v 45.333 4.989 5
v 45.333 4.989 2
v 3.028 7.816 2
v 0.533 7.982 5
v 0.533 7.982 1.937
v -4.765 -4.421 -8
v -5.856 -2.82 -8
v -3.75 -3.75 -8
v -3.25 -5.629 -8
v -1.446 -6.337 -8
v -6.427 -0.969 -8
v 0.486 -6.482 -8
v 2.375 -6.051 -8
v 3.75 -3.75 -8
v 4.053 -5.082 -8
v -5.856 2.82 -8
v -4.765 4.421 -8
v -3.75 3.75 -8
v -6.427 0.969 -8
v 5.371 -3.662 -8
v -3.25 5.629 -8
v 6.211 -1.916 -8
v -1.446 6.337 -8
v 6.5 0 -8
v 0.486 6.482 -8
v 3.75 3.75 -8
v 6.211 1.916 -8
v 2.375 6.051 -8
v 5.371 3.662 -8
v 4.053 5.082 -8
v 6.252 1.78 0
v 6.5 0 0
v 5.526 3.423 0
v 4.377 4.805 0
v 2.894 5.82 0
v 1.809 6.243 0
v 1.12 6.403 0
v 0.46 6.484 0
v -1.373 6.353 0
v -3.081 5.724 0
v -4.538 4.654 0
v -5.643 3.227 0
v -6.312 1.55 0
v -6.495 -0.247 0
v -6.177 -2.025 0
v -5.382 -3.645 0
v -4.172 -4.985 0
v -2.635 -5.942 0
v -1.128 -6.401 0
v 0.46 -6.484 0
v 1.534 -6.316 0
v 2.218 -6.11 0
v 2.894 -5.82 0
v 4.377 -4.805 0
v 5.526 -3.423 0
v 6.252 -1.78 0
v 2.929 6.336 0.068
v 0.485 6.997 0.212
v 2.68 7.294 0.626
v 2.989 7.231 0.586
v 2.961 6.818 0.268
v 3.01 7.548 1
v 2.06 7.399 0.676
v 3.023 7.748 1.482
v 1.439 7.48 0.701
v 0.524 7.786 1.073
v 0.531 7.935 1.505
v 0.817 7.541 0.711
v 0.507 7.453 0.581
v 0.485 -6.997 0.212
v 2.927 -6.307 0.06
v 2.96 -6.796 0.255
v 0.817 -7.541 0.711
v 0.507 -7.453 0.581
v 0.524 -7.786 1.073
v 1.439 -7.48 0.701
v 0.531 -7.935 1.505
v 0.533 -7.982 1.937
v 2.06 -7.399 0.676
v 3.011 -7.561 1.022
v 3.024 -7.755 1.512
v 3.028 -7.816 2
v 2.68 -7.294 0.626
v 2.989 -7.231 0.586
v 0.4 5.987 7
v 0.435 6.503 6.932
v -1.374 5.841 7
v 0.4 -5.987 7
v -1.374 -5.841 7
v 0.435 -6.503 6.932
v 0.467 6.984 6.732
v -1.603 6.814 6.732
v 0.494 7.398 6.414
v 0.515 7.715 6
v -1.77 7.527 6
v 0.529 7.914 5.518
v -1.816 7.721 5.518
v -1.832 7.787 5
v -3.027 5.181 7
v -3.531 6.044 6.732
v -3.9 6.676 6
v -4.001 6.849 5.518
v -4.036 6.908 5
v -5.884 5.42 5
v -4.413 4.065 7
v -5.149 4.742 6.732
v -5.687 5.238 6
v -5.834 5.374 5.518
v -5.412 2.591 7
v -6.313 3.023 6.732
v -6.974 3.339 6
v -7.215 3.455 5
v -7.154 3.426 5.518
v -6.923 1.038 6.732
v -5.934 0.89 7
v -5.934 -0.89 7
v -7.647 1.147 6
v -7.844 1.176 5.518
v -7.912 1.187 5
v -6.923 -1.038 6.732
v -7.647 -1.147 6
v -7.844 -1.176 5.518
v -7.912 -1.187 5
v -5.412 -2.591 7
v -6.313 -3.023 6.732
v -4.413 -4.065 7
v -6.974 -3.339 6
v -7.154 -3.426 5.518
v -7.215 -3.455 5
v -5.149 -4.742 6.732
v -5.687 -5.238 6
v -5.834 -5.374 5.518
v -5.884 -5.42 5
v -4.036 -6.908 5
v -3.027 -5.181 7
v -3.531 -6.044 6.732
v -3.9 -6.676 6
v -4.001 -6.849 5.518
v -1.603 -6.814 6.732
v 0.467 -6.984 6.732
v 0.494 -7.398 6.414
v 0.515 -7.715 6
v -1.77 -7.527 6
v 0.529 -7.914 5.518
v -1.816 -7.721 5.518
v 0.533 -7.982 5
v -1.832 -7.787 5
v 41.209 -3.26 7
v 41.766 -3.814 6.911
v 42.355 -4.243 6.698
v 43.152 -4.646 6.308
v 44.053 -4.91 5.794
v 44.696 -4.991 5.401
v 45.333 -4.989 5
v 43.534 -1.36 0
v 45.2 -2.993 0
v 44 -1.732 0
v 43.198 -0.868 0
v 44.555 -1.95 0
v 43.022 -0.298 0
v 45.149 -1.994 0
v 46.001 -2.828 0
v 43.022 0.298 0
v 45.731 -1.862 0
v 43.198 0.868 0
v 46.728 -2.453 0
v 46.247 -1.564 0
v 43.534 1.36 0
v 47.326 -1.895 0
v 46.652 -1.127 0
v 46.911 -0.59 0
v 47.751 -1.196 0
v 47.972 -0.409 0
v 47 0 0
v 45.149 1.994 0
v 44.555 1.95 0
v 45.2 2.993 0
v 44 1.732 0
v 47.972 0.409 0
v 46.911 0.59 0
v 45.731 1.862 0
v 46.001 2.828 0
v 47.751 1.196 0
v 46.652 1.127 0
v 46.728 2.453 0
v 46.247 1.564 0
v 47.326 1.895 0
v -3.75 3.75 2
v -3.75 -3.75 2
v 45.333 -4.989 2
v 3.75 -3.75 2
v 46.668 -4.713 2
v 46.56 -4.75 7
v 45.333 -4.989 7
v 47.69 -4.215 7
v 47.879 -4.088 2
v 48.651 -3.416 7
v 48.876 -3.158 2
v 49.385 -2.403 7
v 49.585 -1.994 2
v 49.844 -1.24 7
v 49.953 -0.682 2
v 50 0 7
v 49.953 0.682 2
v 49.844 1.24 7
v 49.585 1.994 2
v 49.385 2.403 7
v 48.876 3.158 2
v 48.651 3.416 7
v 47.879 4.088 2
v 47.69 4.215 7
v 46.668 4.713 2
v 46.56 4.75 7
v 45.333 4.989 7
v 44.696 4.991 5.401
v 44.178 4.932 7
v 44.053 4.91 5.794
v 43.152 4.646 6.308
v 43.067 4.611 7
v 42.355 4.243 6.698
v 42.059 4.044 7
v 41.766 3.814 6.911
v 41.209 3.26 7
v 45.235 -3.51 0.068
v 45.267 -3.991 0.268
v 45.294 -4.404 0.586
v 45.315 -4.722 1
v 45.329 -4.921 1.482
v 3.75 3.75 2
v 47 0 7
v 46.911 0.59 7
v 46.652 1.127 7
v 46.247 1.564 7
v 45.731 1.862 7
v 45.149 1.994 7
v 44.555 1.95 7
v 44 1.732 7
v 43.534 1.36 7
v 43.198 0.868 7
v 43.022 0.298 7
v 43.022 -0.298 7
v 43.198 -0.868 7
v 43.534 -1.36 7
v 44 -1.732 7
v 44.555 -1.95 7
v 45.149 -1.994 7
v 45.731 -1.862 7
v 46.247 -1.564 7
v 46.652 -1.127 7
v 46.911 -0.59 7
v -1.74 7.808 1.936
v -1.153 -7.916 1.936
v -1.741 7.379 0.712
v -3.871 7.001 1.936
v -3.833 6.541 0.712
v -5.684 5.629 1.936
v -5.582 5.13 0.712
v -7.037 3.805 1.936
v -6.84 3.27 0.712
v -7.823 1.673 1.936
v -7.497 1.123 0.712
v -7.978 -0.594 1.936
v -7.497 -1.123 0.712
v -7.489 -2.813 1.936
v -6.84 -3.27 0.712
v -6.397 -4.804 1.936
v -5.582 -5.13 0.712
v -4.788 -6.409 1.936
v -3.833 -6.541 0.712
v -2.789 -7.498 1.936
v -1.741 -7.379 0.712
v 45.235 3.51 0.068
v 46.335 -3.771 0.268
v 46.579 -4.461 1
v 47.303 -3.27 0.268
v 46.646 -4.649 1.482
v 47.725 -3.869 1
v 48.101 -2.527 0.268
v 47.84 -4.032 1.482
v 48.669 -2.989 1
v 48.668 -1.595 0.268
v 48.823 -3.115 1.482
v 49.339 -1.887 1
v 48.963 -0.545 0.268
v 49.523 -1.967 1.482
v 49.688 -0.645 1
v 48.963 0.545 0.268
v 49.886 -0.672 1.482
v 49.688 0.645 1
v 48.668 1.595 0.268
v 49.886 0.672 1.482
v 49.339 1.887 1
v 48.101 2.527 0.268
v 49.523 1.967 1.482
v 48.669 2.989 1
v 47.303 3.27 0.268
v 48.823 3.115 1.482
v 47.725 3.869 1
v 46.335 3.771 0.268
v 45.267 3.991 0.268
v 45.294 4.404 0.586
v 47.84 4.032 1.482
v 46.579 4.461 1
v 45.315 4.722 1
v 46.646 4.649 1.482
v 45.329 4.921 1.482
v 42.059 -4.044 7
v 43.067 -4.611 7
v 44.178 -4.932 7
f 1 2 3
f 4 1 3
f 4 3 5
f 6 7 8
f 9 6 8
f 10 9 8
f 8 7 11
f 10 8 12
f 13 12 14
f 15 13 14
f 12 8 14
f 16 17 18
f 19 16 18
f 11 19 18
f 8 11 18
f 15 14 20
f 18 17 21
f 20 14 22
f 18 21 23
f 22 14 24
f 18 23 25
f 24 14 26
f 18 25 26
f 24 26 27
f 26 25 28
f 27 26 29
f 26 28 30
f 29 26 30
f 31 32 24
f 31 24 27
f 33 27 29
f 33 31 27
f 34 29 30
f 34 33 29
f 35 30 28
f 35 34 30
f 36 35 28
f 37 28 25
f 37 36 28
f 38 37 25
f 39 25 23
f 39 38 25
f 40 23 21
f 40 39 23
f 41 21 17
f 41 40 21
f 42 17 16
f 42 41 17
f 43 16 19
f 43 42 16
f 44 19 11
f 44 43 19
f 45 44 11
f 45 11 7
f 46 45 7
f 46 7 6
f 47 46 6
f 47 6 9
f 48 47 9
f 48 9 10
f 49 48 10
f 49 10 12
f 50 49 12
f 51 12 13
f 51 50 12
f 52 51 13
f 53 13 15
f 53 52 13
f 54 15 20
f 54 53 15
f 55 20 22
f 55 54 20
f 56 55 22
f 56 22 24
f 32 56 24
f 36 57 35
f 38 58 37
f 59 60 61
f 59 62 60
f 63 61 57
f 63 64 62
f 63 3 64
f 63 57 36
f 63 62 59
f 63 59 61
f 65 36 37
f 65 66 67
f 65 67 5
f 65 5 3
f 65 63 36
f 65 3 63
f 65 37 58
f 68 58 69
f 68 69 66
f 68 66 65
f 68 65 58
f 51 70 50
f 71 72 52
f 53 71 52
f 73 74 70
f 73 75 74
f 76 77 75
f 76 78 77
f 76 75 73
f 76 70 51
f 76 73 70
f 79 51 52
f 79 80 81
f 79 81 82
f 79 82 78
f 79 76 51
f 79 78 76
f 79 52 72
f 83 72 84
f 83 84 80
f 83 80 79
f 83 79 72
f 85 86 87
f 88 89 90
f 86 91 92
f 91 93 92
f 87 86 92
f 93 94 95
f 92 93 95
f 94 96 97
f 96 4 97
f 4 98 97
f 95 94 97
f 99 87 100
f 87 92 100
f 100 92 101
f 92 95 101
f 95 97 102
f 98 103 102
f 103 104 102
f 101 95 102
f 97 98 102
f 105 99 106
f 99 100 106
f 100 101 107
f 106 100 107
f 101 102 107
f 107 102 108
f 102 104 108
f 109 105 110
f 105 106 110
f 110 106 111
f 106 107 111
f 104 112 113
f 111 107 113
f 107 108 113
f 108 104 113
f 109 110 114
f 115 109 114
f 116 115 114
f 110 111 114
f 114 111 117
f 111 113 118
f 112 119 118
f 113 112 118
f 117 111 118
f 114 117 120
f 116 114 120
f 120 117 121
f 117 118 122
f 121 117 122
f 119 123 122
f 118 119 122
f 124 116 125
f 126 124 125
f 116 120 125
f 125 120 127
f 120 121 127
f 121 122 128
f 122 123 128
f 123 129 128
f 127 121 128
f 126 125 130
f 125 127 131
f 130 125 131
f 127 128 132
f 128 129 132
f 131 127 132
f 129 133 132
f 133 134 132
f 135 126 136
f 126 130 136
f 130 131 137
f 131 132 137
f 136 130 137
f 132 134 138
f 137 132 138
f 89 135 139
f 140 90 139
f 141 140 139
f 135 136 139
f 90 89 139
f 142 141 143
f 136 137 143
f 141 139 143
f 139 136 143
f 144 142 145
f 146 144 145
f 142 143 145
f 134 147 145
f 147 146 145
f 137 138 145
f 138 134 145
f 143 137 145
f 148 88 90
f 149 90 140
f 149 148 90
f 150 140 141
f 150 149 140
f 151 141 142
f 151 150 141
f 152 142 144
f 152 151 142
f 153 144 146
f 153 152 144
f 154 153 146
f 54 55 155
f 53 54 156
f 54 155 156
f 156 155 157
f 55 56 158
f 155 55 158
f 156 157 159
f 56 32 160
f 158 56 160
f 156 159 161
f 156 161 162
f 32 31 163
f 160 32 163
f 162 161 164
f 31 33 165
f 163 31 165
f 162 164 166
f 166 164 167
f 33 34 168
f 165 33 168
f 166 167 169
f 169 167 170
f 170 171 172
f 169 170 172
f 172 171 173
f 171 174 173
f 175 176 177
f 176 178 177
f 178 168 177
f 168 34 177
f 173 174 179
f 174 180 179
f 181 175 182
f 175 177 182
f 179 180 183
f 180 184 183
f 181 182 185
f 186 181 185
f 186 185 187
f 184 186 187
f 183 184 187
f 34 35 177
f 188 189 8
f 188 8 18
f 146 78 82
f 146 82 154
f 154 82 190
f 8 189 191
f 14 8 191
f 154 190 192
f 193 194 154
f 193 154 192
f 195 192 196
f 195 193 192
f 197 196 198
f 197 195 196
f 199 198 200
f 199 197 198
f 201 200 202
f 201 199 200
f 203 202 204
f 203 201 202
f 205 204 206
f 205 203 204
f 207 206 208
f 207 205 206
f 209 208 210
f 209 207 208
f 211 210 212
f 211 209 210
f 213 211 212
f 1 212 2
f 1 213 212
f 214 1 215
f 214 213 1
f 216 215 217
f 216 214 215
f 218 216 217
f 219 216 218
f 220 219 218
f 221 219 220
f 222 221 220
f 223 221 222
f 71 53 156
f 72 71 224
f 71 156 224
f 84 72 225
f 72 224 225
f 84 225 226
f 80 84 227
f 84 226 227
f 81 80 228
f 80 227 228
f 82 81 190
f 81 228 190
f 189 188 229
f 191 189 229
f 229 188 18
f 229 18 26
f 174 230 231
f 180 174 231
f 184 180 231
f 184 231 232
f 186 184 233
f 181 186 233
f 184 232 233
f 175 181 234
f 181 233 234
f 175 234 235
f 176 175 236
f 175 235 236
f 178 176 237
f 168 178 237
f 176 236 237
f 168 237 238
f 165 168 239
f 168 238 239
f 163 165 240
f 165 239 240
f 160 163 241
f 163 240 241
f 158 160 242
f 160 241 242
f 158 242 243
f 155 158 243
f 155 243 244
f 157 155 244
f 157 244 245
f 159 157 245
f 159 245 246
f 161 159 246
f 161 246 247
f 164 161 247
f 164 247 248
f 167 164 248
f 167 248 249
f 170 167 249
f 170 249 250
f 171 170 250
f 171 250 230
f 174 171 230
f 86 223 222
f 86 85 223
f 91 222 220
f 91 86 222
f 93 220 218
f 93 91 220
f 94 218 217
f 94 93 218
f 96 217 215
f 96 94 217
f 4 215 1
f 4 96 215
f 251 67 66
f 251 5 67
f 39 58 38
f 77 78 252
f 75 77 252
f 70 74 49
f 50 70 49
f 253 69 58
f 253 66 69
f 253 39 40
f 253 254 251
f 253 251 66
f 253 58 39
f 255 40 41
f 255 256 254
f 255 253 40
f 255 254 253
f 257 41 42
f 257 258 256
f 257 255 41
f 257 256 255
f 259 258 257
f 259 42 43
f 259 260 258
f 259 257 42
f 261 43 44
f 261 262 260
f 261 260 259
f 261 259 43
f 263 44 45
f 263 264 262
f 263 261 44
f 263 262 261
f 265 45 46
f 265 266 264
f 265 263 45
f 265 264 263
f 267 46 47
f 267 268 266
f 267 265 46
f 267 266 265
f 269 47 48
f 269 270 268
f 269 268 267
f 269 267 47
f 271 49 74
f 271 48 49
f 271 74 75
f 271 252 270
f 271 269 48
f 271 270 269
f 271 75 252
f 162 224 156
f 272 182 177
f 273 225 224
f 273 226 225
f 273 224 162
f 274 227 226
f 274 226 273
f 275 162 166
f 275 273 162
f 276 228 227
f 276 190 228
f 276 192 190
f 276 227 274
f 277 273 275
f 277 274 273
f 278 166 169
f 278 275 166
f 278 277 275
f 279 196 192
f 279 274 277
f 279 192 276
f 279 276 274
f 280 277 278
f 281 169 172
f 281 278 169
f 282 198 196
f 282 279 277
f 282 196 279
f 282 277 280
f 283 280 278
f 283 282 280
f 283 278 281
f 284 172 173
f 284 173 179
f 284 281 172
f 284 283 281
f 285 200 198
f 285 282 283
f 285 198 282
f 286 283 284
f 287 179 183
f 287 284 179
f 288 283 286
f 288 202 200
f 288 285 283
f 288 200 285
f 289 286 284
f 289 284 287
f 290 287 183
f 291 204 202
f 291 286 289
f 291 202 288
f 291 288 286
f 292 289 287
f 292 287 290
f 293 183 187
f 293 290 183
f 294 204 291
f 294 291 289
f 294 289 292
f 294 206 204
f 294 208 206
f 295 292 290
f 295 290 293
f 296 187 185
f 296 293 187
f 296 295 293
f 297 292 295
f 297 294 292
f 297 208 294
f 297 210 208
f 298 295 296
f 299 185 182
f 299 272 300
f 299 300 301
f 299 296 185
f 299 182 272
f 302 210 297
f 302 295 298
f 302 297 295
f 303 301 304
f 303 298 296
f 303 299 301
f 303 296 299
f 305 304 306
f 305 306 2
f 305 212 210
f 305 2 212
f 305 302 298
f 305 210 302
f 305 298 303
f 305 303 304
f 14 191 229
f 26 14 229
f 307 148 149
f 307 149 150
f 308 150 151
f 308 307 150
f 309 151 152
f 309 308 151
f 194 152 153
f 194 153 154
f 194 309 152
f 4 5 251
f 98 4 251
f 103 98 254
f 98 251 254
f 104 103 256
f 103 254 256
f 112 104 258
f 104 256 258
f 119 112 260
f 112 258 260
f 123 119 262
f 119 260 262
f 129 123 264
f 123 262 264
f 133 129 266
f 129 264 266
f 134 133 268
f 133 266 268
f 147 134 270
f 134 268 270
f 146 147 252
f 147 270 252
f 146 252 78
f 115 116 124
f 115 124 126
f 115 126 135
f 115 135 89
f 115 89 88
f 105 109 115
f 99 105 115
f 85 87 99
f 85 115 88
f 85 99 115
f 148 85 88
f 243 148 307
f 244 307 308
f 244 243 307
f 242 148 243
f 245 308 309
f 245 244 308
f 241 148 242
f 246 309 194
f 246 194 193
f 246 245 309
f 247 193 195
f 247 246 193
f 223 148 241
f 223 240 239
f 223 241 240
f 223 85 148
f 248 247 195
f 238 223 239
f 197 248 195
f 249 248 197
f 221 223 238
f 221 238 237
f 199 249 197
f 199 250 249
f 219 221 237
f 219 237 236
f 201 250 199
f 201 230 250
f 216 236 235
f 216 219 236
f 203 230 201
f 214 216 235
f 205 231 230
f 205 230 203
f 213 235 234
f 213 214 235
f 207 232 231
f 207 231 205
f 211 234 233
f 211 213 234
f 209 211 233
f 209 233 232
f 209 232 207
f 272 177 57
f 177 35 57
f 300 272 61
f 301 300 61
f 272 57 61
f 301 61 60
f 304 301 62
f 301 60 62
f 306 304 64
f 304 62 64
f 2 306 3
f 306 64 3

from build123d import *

# Parameters (mm, degrees)
F1_DEPTH = 7
F2_R     = 6.5
F2_W     = 7.5
F2_H     = 7.5
F3_DEPTH = 15
F2_R_2   = 2
F4_DEPTH = 25
F5_START = -5
F5_DEPTH = 10.001
F6_R     = 2
F7_DEPTH = 2.8


with BuildPart() as f1:
    # F0 (on Top) → F1 (new body)
    with BuildSketch(Plane.XY):
        with BuildLine():
            Line((45.3333333333, 4.9888765157), (0.5333333333, 7.9822024251))
            ThreePointArc((0.5333333333, 7.9822024251), (-8, 0), (0.5333333333, -7.9822024251))
            Line((0.5333333333, -7.9822024251), (45.3333333333, -4.9888765157))
            ThreePointArc((45.3333333333, -4.9888765157), (50, 0), (45.3333333333, 4.9888765157))
        make_face()
    extrude(amount=F1_DEPTH)

    # F2 (on face) → F3 (join)
    with BuildSketch(Plane.XY.offset(7)):
        Circle(F2_R)
        Rectangle(F2_W, F2_H, mode=Mode.SUBTRACT)
    extrude(amount=-F3_DEPTH)

    # F2 (on face) → F4 (cut)
    with BuildSketch(Plane.XY.offset(7)):
        with Locations((45, 0)):
            Circle(F2_R_2)
    extrude(amount=-F4_DEPTH, mode=Mode.SUBTRACT)

    # F2 (on face) → F5 (cut)
    with BuildSketch(Plane.XY.offset(7).offset(F5_START)):
        Rectangle(F2_W, F2_H)
    extrude(amount=-F5_DEPTH, mode=Mode.SUBTRACT)

    # F6
    f6_edges = [f1.edges().sort_by_distance(p)[0] for p in [
        (22.933333, -6.485539, 7),
        (22.933333, 6.485539, 0),
    ]]
    fillet(f6_edges, radius=F6_R)

    # F2 (on face) → F7 (join)
    with BuildSketch(Plane.XY.offset(7)):
        with BuildLine():
            ThreePointArc((45.3333333333, -4.9888765157), (48.6514837167, -3.4156502553), (50, 0))
            ThreePointArc((50, 0), (48.6514837167, 3.4156502553), (45.3333333333, 4.9888765157))
            ThreePointArc((45.3333333333, 4.9888765157), (40, 0), (45.3333333333, -4.9888765157))
        make_face()
        with Locations((45, 0)):
            Circle(F2_R_2, mode=Mode.SUBTRACT)
    extrude(amount=-F7_DEPTH)


solid = f1.part
